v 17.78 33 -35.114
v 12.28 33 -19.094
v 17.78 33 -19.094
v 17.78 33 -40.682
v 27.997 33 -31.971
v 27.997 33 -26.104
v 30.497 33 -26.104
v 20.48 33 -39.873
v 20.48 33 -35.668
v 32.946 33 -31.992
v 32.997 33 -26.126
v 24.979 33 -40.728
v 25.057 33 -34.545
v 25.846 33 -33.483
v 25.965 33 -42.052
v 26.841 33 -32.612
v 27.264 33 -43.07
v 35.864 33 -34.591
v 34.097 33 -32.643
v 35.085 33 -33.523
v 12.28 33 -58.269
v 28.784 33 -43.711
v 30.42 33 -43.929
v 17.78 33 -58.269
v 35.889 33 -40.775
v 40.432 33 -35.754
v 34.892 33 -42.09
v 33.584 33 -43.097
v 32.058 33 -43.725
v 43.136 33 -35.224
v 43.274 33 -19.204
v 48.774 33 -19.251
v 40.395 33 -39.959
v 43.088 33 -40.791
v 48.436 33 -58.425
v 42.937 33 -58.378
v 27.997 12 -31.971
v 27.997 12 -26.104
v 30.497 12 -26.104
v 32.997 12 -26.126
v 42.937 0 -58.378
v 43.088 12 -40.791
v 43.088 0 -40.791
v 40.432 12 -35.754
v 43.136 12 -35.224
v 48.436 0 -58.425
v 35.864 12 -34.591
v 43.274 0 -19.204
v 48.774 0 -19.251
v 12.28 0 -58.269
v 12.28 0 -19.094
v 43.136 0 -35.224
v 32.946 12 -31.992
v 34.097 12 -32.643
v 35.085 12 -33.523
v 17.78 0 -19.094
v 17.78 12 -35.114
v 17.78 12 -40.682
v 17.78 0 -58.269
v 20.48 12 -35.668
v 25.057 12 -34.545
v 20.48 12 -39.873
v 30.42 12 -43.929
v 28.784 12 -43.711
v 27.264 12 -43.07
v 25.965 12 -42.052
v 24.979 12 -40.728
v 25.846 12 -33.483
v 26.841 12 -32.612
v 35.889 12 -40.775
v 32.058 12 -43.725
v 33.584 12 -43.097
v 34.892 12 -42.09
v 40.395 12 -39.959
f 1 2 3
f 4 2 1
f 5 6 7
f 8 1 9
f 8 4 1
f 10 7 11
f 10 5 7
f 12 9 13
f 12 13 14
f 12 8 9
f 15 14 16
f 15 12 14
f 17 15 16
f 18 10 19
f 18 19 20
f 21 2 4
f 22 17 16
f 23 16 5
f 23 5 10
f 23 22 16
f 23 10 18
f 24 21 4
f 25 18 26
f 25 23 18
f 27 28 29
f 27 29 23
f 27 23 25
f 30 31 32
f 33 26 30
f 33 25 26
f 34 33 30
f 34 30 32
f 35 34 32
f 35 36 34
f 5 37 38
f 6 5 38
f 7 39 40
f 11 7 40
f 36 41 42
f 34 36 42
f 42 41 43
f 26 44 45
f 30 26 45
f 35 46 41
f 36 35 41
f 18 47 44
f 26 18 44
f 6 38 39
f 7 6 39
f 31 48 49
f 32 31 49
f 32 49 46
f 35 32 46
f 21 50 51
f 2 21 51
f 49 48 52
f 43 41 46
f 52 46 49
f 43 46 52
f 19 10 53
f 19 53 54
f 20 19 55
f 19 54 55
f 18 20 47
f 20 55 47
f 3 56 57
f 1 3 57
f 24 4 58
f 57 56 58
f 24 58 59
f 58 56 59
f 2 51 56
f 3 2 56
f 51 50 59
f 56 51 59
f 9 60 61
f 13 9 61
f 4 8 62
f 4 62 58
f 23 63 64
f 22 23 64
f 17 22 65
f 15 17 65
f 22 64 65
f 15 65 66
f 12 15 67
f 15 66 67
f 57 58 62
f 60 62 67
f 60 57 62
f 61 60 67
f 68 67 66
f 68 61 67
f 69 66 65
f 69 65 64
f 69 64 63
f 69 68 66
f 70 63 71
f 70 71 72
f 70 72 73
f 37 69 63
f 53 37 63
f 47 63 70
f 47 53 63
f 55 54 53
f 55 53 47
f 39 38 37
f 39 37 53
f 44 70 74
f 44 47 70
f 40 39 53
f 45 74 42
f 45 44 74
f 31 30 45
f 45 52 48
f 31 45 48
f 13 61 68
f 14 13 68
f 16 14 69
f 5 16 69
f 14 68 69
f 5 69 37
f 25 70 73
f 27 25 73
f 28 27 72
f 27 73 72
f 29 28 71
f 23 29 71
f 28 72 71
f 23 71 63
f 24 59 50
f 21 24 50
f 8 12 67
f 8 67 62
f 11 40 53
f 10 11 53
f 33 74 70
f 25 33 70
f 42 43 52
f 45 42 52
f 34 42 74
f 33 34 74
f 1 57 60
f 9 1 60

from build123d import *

# Parameters (mm, degrees)
BOSS_EXTRUDE1_DEPTH     = 33
CUT_EXTRUDE1_DEPTH      = 83.954293528
CUT_EXTRUDE1_DEPTH_BACK = 12
SKETCH3_W               = 9.481209811
SKETCH3_H               = 17.021727652
CUT_EXTRUDE2_DEPTH      = 22


with BuildPart() as part:
    # Sketch1 → Boss-Extrude1 (new body)
    with BuildSketch(Plane(origin=(0, 0, 0), x_dir=(1, 0, 0), z_dir=(0, 1, 0))):
        with BuildLine():
            Line((27.99701897, 26.104397373), (30.497019389, 26.104397373))
            Line((30.497019389, 26.104397373), (32.996926828, 26.125958592))
            Line((32.996926828, 26.125958592), (32.946330796, 31.992296402))
            ThreePointArc((32.946330796, 31.992296402), (34.614300355, 33.056919945), (35.86386473, 34.591238885))
            Line((35.86386473, 34.591238885), (40.431539769, 35.753760832))
            Line((40.431539769, 35.753760832), (43.136211097, 35.223788843))
            Line((43.136211097, 35.223788843), (43.274382132, 19.203600277))
            Line((43.274382132, 19.203600277), (48.774177579, 19.251034952))
            Line((48.774177579, 19.251034952), (48.43630867, 58.425118026))
            Line((48.43630867, 58.425118026), (42.936513223, 58.377683351))
            Line((42.936513223, 58.377683351), (43.088196039, 40.790876563))
            Line((43.088196039, 40.790876563), (40.395268448, 39.959225491))
            Line((40.395268448, 39.959225491), (35.888631414, 40.775372904))
            ThreePointArc((35.888631414, 40.775372904), (33.583892359, 43.097075019), (30.420151943, 43.929462788))
            ThreePointArc((30.420151943, 43.929462788), (27.263708108, 43.06982034), (24.979078258, 40.728327384))
            Line((24.979078258, 40.728327384), (20.479647685, 39.873342894))
            Line((20.479647685, 39.873342894), (17.779647685, 40.681737919))
            Line((17.779647685, 40.681737919), (17.779647685, 58.269198812))
            Line((17.779647685, 58.269198812), (12.279647685, 58.269198812))
            Line((12.279647685, 58.269198812), (12.279647685, 19.093658738))
            Line((12.279647685, 19.093658738), (17.779647685, 19.093658738))
            Line((17.779647685, 19.093658738), (17.779647685, 35.114443143))
            Line((17.779647685, 35.114443143), (20.479647685, 35.667721822))
            Line((20.479647685, 35.667721822), (25.057179, 34.544636961))
            ThreePointArc((25.057179, 34.544636961), (26.319929615, 33.021151936), (27.99701897, 31.970953369))
            Line((27.99701897, 31.970953369), (27.99701897, 26.104397373))
        make_face()
    extrude(amount=BOSS_EXTRUDE1_DEPTH)

    # Sketch2 → Cut-Extrude1 (cut, two sides: drawn at the far end of the back side and taken through both)
    with BuildSketch(Plane.XZ.offset(-CUT_EXTRUDE1_DEPTH_BACK)):
        with BuildLine():
            Line((20.479647685, -35.667721822), (17.779647685, -35.114443143))
            Line((17.779647685, -35.114443143), (17.779647685, -40.681737919))
            Line((17.779647685, -40.681737919), (20.479647685, -39.873342894))
            Line((20.479647685, -39.873342894), (24.979078258, -40.728327384))
            ThreePointArc((24.979078258, -40.728327384), (27.263708108, -43.06982034), (30.420151943, -43.929462788))
            ThreePointArc((30.420151943, -43.929462788), (33.576595778, -43.084424394), (35.888631414, -40.775372904))
            Line((35.888631414, -40.775372904), (40.395268448, -39.959225491))
            Line((40.395268448, -39.959225491), (43.088196039, -40.790876563))
            Line((43.088196039, -40.790876563), (43.136211097, -35.223788843))
            Line((43.136211097, -35.223788843), (40.431539769, -35.753760832))
            Line((40.431539769, -35.753760832), (35.86386473, -34.591238885))
            ThreePointArc((35.86386473, -34.591238885), (34.614300355, -33.056919945), (32.946330796, -31.992296402))
            Line((32.946330796, -31.992296402), (32.996926828, -26.125958592))
            Line((32.996926828, -26.125958592), (27.99701897, -26.104397373))
            Line((27.99701897, -26.104397373), (27.99701897, -31.970953369))
            ThreePointArc((27.99701897, -31.970953369), (26.319929615, -33.021151936), (25.057179, -34.544636961))
            Line((25.057179, -34.544636961), (20.479647685, -35.667721822))
        make_face()
    extrude(amount=CUT_EXTRUDE1_DEPTH + CUT_EXTRUDE1_DEPTH_BACK, mode=Mode.SUBTRACT)

    # Sketch3 → Cut-Extrude2 (cut)
    with BuildSketch(Plane.XY.offset(-26.104397373)):
        with Locations((32.737623876, 3.489136174)):
            Rectangle(SKETCH3_W, SKETCH3_H)
    extrude(amount=-CUT_EXTRUDE2_DEPTH, mode=Mode.SUBTRACT)


solid = part.part
